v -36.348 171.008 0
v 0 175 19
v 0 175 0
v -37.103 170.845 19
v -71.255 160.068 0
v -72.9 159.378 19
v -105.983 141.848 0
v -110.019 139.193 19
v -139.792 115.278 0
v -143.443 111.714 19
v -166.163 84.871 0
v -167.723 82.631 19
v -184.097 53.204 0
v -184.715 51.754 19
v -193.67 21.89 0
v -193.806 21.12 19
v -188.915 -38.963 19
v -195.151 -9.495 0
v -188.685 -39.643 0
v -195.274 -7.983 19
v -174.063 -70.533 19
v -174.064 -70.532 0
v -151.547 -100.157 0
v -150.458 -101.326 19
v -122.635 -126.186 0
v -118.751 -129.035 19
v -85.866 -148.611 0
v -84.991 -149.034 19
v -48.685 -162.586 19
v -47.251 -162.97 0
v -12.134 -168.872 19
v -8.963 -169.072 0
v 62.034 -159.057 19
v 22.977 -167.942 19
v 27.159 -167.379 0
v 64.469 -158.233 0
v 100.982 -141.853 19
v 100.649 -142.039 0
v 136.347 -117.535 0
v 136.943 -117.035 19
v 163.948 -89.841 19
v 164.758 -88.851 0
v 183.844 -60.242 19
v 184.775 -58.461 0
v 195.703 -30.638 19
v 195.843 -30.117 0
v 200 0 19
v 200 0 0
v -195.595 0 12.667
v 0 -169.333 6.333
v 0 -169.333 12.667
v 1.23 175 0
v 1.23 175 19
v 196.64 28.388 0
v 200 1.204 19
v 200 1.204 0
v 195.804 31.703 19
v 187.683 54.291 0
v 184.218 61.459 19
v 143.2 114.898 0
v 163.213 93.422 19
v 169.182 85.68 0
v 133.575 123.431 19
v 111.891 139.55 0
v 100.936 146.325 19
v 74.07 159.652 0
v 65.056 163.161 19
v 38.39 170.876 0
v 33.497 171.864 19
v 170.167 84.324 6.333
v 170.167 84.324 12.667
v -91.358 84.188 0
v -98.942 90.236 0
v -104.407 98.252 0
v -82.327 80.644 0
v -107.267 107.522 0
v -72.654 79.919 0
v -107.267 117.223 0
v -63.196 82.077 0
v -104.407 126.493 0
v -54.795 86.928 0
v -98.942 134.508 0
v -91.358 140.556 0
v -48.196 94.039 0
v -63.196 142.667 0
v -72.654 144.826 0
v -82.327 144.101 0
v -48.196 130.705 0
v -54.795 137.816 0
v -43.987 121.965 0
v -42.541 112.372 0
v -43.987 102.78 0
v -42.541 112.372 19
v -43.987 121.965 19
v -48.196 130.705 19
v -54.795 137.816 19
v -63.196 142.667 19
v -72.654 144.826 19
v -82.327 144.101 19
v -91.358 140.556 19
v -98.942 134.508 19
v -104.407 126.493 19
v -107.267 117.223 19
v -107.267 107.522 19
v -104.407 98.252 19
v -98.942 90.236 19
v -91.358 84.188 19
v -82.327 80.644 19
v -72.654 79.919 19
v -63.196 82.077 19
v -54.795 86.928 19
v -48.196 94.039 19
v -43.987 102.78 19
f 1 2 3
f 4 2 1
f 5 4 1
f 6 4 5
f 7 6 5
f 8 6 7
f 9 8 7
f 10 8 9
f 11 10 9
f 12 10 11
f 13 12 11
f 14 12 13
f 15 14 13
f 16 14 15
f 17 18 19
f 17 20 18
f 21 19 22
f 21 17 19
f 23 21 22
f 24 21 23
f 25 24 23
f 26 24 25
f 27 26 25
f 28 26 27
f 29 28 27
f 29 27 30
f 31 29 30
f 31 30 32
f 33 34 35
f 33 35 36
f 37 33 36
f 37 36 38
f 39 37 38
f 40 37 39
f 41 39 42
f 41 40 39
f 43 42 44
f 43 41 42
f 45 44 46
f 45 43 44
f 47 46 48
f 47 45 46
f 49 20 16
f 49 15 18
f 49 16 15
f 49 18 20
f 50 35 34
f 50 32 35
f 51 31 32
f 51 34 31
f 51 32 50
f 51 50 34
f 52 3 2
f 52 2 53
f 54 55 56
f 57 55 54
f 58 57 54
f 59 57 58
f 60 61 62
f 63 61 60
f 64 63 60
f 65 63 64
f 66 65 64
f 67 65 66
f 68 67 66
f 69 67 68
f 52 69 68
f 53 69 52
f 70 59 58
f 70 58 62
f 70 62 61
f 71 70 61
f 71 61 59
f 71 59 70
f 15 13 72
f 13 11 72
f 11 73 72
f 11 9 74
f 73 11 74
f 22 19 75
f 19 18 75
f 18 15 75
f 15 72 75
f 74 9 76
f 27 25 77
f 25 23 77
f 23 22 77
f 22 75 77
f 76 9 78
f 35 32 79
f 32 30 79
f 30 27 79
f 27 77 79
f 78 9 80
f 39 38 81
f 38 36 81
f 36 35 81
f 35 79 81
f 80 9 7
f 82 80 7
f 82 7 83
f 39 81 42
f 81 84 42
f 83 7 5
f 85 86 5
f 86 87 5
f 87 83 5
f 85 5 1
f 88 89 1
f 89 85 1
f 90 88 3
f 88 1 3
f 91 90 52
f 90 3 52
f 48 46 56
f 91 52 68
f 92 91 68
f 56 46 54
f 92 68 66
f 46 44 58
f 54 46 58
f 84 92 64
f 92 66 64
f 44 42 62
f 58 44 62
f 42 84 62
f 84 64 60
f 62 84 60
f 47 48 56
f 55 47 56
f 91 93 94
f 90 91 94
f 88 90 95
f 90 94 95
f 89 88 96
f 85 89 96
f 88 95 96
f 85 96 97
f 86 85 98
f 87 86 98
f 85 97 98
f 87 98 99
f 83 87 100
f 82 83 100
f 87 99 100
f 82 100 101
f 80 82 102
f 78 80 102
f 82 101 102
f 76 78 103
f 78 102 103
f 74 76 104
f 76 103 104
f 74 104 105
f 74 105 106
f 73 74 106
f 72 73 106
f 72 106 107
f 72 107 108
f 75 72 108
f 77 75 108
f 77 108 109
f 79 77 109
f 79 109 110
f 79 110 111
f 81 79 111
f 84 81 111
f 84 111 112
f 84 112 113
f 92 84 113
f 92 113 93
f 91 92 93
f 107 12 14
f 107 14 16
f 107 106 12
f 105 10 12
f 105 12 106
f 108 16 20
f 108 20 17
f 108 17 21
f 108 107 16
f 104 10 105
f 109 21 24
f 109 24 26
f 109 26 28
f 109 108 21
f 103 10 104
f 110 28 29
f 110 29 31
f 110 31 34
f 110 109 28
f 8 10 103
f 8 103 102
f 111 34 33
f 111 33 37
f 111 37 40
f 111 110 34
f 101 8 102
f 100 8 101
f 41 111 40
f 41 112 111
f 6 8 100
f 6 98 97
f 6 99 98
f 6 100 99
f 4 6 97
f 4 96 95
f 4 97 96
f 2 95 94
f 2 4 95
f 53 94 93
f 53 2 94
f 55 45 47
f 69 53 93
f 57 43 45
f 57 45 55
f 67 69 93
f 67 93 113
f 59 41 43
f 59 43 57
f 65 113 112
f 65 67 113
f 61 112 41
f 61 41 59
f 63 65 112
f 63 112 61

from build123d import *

# Parameters (mm, degrees)
F0_W     = 400
F0_H     = 350
F1_DEPTH = 19
F3_DEPTH = 25
F2_R     = 32.5444100718
F4_DEPTH = 25


with BuildPart() as f1:
    # F0 (on Top) → F1 (new body)
    with BuildSketch(Plane.XY):
        Rectangle(F0_W, F0_H)
    extrude(amount=F1_DEPTH)

    # F2 (on face) → F3 (cut)
    with BuildSketch(Plane.XY.offset(19)):
        with BuildLine():
            Line((200, 175), (1.2303346045, 175))
            add(Edge.make_bspline(
                [(200, 1.2037944383), (199.5351083689, 87.0242167051), (99.8085920468, 174.6364886784), (1.2303346045, 175)],
                knots=[0.7494961922, 0.7494961922, 0.7494961922, 0.7494961922, 0.9989620997, 0.9989620997, 0.9989620997, 0.9989620997], degree=3))
            Line((200, 1.2037944383), (200, 175))
        make_face()
        with BuildLine():
            add(Edge.make_bspline(
                [(0, 175), (-98.8187558399, 174.6350450151), (-292.6120906446, -1.5966892013), (-0.9342373868, -252.8984666735), (199.5335407467, -85.9557258275), (200, 0)],
                knots=[0, 0, 0, 0, 0.2501031726, 0.4984159764, 0.7483296585, 0.7483296585, 0.7483296585, 0.7483296585], degree=3))
            Line((0, 175), (-200, 175))
            Line((-200, 175), (-200, -175))
            Line((-200, -175), (200, -175))
            Line((200, -175), (200, 0))
        make_face()
    extrude(amount=-F3_DEPTH, mode=Mode.SUBTRACT)

    # F2 (on face) → F4 (cut)
    with BuildSketch(Plane.XY.offset(19)):
        with Locations((-75.0856101513, 112.3721450567)):
            Circle(F2_R)
    extrude(amount=-F4_DEPTH, mode=Mode.SUBTRACT)


solid = f1.part
